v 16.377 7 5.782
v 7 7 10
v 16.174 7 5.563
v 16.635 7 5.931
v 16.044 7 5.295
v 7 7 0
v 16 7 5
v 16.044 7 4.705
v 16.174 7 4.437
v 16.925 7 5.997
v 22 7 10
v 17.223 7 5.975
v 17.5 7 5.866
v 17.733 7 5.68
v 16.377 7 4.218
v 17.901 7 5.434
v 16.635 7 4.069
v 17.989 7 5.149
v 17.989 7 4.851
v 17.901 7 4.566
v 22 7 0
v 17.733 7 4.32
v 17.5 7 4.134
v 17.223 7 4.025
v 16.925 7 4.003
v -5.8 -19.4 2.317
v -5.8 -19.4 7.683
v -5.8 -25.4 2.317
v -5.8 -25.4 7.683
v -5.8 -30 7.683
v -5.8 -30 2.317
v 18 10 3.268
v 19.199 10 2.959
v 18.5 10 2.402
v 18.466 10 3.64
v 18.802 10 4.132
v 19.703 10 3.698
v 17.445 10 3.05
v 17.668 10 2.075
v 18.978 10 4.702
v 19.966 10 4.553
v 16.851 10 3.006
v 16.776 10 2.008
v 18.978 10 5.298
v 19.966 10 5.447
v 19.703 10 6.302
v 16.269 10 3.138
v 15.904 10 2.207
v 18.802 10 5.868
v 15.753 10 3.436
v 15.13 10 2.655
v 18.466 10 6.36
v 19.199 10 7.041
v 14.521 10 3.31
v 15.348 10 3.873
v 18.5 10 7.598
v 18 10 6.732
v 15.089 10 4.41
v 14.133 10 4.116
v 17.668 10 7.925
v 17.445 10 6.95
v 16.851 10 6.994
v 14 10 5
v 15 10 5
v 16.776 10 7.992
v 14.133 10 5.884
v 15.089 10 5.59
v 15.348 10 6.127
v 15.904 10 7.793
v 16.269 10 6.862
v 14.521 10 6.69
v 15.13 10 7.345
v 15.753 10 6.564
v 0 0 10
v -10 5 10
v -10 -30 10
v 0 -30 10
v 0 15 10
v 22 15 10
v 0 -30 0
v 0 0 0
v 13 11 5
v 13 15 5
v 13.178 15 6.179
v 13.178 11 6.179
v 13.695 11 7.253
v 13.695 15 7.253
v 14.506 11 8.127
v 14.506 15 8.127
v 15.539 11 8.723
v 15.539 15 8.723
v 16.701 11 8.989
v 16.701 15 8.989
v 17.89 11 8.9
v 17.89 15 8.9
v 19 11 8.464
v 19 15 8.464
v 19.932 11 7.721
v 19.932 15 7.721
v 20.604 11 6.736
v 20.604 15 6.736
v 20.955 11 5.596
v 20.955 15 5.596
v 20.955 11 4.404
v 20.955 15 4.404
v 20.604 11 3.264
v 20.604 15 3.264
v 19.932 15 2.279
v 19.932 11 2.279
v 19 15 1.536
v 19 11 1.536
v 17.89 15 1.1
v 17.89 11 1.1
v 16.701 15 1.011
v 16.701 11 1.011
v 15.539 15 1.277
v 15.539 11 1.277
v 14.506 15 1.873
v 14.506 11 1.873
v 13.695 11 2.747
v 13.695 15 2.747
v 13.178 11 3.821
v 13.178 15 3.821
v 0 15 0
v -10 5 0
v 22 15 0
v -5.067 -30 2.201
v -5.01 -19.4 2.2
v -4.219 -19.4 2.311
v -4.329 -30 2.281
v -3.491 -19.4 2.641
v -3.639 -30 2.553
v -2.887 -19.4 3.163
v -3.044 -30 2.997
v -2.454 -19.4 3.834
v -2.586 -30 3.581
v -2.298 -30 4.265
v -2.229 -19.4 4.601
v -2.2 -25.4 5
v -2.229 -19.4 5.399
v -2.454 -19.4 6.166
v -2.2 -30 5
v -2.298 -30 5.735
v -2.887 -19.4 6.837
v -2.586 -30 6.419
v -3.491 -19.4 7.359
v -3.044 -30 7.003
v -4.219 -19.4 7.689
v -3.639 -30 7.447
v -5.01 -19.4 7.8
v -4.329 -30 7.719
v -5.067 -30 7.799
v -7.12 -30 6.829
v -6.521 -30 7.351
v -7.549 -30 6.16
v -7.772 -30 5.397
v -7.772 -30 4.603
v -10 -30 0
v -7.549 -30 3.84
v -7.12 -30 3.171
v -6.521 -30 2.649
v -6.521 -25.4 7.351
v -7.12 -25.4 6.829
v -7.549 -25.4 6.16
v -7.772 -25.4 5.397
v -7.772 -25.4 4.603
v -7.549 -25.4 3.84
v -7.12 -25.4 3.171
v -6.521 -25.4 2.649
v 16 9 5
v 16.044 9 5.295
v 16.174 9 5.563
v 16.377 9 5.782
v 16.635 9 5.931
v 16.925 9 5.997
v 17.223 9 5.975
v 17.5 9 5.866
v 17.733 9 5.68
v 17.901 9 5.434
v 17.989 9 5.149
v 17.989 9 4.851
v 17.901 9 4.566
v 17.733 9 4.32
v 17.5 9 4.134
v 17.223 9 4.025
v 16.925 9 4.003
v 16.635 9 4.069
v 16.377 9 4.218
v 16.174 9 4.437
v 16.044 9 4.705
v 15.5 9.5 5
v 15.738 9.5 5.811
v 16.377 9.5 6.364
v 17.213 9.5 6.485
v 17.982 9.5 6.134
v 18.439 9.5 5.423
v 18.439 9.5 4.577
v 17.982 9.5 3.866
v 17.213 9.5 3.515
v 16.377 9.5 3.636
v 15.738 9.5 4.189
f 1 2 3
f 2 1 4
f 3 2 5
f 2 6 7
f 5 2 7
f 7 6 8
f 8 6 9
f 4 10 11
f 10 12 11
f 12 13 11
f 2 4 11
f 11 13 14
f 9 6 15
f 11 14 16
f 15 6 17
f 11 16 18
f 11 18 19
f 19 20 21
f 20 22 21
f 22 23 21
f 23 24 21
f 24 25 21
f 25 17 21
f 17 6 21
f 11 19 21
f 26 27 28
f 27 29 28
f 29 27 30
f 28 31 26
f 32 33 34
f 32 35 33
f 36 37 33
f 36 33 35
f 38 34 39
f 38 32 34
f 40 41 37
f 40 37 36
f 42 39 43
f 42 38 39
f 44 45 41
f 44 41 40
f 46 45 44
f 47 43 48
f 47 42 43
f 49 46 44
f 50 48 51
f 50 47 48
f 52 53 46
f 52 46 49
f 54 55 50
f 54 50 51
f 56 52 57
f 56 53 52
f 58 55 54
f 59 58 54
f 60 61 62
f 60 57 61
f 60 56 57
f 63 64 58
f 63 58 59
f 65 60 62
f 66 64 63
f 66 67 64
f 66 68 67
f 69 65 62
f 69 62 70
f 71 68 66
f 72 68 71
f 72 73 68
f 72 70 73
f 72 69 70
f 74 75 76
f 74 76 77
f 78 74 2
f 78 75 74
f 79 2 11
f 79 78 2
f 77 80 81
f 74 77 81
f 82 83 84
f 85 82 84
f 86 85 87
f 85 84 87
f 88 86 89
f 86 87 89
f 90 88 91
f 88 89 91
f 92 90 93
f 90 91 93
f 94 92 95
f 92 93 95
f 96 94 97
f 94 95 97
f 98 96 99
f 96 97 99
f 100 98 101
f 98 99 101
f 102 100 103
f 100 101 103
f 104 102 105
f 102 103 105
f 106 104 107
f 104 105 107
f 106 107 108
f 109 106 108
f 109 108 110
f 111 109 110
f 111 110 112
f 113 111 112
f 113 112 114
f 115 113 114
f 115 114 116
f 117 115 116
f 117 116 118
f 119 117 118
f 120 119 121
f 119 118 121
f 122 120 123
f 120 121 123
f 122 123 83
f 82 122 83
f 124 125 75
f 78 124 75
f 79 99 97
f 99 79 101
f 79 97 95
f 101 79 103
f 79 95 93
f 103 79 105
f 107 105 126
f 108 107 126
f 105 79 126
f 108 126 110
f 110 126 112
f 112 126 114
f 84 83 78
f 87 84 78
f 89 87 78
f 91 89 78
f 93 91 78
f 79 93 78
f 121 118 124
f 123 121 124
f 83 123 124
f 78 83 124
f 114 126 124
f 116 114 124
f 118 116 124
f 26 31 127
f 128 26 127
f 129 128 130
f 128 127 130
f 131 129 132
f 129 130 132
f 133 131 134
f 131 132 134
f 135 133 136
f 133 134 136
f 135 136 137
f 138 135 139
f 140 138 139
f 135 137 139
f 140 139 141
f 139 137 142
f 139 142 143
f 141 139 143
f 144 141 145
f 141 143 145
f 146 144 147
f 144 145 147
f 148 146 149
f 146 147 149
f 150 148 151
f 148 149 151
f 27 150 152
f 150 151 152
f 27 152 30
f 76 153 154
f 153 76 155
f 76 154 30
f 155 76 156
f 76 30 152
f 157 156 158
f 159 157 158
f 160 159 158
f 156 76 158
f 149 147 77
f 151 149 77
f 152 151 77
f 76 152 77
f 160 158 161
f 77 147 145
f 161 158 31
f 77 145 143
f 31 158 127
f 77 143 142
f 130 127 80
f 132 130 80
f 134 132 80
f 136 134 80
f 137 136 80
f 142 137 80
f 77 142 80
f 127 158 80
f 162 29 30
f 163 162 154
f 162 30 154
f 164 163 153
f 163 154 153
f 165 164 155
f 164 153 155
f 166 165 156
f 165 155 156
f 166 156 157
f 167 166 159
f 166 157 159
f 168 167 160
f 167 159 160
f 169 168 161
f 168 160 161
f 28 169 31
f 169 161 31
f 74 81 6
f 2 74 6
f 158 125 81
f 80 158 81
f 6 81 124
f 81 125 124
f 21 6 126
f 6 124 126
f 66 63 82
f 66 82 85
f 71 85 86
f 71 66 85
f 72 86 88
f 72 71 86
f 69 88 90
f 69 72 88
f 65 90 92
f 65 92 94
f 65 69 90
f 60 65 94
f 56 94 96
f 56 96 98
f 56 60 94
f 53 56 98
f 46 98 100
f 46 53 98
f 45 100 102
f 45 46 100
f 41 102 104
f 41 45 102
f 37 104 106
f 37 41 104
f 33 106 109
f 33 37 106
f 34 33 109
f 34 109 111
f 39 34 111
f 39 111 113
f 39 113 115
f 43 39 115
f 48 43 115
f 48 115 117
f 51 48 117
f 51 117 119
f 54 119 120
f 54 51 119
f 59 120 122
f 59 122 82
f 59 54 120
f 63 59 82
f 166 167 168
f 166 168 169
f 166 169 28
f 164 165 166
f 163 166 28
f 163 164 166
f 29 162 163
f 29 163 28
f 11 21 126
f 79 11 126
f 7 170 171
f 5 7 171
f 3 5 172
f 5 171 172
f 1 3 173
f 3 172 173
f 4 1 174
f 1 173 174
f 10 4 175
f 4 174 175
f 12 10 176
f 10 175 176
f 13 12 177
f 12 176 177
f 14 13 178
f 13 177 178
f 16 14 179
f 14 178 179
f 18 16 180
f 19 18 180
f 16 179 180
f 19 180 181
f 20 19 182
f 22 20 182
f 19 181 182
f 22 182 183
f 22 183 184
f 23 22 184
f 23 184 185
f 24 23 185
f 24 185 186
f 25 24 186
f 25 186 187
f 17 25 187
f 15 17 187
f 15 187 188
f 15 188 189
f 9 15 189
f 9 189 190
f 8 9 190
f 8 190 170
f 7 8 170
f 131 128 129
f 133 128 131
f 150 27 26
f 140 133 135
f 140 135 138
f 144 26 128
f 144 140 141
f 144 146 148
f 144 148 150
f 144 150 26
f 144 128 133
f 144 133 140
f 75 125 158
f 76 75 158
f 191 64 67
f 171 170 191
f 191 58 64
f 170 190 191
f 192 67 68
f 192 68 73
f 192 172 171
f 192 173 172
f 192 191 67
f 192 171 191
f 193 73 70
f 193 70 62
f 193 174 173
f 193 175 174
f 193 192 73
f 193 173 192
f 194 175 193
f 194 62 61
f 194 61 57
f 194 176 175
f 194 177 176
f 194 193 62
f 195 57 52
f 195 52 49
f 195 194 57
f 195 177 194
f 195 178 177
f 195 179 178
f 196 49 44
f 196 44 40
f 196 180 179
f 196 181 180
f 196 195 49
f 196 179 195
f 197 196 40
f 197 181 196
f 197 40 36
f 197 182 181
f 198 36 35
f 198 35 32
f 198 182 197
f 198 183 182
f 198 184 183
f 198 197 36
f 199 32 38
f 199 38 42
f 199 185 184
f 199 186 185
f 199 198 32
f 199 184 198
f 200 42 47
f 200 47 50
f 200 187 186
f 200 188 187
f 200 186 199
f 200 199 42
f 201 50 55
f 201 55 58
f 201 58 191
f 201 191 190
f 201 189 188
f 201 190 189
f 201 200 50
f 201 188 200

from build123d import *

# Parameters (mm, degrees)
PAD_DEPTH       = 10
CHAMFER_SIZE    = 10
POCKET_DEPTH    = 10.6
SKETCH002_R     = 2.8
POCKET001_DEPTH = 4.6
SKETCH003_R     = 1
POCKET002_DEPTH = 45.001
SKETCH004_R     = 4
POCKET003_DEPTH = 5
CHAMFER001_SIZE = 1
CHAMFER002_SIZE = 1


with BuildPart() as part:
    # Sketch → Pad (new body)
    with BuildSketch(Plane.XY):
        Polygon((22, 15), (-10, 15), (-10, -30), (0, -30), (0, 0), (7, 7), (22, 7), align=None)
    extrude(amount=PAD_DEPTH)

    # Chamfer
    chamfer_edges = [part.edges().sort_by_distance(p)[0] for p in [
        (-10, 15, 5),
    ]]
    chamfer(chamfer_edges, length=CHAMFER_SIZE)

    # Sketch001 → Pocket (cut)
    with BuildSketch(Plane.XZ.offset(30)):
        with BuildLine():
            ThreePointArc((-5.8, 2.316718), (-2.2, 5), (-5.8, 7.683282))
            Line((-5.8, 7.683282), (-5.8, 2.316718))
        make_face()
    extrude(amount=-POCKET_DEPTH, mode=Mode.SUBTRACT)

    # Sketch002 → Pocket001 (cut)
    with BuildSketch(Plane.XZ.offset(30)):
        with Locations((-5, 5)):
            Circle(SKETCH002_R)
    extrude(amount=-POCKET001_DEPTH, mode=Mode.SUBTRACT)

    # Sketch003 → Pocket002 (cut, through all)
    with BuildSketch(Plane(origin=(0, 15, 0), x_dir=(-1, 0, 0), z_dir=(0, 1, 0))):
        with Locations((-17, 5)):
            Circle(SKETCH003_R)
    extrude(amount=-POCKET002_DEPTH, mode=Mode.SUBTRACT)

    # Sketch004 → Pocket003 (cut)
    with BuildSketch(Plane(origin=(0, 15, 0), x_dir=(-1, 0, 0), z_dir=(0, 1, 0))):
        with Locations((-17, 5)):
            Circle(SKETCH004_R)
    extrude(amount=-POCKET003_DEPTH, mode=Mode.SUBTRACT)

    # Chamfer001
    chamfer001_edges = [part.edges().sort_by_distance(p)[0] for p in [
        (21, 10, 5),
    ]]
    chamfer(chamfer001_edges, length=CHAMFER001_SIZE)

    # Chamfer002
    chamfer002_edges = [part.edges().sort_by_distance(p)[0] for p in [
        (18, 10, 5),
    ]]
    chamfer(chamfer002_edges, length=CHAMFER002_SIZE)


solid = part.part
